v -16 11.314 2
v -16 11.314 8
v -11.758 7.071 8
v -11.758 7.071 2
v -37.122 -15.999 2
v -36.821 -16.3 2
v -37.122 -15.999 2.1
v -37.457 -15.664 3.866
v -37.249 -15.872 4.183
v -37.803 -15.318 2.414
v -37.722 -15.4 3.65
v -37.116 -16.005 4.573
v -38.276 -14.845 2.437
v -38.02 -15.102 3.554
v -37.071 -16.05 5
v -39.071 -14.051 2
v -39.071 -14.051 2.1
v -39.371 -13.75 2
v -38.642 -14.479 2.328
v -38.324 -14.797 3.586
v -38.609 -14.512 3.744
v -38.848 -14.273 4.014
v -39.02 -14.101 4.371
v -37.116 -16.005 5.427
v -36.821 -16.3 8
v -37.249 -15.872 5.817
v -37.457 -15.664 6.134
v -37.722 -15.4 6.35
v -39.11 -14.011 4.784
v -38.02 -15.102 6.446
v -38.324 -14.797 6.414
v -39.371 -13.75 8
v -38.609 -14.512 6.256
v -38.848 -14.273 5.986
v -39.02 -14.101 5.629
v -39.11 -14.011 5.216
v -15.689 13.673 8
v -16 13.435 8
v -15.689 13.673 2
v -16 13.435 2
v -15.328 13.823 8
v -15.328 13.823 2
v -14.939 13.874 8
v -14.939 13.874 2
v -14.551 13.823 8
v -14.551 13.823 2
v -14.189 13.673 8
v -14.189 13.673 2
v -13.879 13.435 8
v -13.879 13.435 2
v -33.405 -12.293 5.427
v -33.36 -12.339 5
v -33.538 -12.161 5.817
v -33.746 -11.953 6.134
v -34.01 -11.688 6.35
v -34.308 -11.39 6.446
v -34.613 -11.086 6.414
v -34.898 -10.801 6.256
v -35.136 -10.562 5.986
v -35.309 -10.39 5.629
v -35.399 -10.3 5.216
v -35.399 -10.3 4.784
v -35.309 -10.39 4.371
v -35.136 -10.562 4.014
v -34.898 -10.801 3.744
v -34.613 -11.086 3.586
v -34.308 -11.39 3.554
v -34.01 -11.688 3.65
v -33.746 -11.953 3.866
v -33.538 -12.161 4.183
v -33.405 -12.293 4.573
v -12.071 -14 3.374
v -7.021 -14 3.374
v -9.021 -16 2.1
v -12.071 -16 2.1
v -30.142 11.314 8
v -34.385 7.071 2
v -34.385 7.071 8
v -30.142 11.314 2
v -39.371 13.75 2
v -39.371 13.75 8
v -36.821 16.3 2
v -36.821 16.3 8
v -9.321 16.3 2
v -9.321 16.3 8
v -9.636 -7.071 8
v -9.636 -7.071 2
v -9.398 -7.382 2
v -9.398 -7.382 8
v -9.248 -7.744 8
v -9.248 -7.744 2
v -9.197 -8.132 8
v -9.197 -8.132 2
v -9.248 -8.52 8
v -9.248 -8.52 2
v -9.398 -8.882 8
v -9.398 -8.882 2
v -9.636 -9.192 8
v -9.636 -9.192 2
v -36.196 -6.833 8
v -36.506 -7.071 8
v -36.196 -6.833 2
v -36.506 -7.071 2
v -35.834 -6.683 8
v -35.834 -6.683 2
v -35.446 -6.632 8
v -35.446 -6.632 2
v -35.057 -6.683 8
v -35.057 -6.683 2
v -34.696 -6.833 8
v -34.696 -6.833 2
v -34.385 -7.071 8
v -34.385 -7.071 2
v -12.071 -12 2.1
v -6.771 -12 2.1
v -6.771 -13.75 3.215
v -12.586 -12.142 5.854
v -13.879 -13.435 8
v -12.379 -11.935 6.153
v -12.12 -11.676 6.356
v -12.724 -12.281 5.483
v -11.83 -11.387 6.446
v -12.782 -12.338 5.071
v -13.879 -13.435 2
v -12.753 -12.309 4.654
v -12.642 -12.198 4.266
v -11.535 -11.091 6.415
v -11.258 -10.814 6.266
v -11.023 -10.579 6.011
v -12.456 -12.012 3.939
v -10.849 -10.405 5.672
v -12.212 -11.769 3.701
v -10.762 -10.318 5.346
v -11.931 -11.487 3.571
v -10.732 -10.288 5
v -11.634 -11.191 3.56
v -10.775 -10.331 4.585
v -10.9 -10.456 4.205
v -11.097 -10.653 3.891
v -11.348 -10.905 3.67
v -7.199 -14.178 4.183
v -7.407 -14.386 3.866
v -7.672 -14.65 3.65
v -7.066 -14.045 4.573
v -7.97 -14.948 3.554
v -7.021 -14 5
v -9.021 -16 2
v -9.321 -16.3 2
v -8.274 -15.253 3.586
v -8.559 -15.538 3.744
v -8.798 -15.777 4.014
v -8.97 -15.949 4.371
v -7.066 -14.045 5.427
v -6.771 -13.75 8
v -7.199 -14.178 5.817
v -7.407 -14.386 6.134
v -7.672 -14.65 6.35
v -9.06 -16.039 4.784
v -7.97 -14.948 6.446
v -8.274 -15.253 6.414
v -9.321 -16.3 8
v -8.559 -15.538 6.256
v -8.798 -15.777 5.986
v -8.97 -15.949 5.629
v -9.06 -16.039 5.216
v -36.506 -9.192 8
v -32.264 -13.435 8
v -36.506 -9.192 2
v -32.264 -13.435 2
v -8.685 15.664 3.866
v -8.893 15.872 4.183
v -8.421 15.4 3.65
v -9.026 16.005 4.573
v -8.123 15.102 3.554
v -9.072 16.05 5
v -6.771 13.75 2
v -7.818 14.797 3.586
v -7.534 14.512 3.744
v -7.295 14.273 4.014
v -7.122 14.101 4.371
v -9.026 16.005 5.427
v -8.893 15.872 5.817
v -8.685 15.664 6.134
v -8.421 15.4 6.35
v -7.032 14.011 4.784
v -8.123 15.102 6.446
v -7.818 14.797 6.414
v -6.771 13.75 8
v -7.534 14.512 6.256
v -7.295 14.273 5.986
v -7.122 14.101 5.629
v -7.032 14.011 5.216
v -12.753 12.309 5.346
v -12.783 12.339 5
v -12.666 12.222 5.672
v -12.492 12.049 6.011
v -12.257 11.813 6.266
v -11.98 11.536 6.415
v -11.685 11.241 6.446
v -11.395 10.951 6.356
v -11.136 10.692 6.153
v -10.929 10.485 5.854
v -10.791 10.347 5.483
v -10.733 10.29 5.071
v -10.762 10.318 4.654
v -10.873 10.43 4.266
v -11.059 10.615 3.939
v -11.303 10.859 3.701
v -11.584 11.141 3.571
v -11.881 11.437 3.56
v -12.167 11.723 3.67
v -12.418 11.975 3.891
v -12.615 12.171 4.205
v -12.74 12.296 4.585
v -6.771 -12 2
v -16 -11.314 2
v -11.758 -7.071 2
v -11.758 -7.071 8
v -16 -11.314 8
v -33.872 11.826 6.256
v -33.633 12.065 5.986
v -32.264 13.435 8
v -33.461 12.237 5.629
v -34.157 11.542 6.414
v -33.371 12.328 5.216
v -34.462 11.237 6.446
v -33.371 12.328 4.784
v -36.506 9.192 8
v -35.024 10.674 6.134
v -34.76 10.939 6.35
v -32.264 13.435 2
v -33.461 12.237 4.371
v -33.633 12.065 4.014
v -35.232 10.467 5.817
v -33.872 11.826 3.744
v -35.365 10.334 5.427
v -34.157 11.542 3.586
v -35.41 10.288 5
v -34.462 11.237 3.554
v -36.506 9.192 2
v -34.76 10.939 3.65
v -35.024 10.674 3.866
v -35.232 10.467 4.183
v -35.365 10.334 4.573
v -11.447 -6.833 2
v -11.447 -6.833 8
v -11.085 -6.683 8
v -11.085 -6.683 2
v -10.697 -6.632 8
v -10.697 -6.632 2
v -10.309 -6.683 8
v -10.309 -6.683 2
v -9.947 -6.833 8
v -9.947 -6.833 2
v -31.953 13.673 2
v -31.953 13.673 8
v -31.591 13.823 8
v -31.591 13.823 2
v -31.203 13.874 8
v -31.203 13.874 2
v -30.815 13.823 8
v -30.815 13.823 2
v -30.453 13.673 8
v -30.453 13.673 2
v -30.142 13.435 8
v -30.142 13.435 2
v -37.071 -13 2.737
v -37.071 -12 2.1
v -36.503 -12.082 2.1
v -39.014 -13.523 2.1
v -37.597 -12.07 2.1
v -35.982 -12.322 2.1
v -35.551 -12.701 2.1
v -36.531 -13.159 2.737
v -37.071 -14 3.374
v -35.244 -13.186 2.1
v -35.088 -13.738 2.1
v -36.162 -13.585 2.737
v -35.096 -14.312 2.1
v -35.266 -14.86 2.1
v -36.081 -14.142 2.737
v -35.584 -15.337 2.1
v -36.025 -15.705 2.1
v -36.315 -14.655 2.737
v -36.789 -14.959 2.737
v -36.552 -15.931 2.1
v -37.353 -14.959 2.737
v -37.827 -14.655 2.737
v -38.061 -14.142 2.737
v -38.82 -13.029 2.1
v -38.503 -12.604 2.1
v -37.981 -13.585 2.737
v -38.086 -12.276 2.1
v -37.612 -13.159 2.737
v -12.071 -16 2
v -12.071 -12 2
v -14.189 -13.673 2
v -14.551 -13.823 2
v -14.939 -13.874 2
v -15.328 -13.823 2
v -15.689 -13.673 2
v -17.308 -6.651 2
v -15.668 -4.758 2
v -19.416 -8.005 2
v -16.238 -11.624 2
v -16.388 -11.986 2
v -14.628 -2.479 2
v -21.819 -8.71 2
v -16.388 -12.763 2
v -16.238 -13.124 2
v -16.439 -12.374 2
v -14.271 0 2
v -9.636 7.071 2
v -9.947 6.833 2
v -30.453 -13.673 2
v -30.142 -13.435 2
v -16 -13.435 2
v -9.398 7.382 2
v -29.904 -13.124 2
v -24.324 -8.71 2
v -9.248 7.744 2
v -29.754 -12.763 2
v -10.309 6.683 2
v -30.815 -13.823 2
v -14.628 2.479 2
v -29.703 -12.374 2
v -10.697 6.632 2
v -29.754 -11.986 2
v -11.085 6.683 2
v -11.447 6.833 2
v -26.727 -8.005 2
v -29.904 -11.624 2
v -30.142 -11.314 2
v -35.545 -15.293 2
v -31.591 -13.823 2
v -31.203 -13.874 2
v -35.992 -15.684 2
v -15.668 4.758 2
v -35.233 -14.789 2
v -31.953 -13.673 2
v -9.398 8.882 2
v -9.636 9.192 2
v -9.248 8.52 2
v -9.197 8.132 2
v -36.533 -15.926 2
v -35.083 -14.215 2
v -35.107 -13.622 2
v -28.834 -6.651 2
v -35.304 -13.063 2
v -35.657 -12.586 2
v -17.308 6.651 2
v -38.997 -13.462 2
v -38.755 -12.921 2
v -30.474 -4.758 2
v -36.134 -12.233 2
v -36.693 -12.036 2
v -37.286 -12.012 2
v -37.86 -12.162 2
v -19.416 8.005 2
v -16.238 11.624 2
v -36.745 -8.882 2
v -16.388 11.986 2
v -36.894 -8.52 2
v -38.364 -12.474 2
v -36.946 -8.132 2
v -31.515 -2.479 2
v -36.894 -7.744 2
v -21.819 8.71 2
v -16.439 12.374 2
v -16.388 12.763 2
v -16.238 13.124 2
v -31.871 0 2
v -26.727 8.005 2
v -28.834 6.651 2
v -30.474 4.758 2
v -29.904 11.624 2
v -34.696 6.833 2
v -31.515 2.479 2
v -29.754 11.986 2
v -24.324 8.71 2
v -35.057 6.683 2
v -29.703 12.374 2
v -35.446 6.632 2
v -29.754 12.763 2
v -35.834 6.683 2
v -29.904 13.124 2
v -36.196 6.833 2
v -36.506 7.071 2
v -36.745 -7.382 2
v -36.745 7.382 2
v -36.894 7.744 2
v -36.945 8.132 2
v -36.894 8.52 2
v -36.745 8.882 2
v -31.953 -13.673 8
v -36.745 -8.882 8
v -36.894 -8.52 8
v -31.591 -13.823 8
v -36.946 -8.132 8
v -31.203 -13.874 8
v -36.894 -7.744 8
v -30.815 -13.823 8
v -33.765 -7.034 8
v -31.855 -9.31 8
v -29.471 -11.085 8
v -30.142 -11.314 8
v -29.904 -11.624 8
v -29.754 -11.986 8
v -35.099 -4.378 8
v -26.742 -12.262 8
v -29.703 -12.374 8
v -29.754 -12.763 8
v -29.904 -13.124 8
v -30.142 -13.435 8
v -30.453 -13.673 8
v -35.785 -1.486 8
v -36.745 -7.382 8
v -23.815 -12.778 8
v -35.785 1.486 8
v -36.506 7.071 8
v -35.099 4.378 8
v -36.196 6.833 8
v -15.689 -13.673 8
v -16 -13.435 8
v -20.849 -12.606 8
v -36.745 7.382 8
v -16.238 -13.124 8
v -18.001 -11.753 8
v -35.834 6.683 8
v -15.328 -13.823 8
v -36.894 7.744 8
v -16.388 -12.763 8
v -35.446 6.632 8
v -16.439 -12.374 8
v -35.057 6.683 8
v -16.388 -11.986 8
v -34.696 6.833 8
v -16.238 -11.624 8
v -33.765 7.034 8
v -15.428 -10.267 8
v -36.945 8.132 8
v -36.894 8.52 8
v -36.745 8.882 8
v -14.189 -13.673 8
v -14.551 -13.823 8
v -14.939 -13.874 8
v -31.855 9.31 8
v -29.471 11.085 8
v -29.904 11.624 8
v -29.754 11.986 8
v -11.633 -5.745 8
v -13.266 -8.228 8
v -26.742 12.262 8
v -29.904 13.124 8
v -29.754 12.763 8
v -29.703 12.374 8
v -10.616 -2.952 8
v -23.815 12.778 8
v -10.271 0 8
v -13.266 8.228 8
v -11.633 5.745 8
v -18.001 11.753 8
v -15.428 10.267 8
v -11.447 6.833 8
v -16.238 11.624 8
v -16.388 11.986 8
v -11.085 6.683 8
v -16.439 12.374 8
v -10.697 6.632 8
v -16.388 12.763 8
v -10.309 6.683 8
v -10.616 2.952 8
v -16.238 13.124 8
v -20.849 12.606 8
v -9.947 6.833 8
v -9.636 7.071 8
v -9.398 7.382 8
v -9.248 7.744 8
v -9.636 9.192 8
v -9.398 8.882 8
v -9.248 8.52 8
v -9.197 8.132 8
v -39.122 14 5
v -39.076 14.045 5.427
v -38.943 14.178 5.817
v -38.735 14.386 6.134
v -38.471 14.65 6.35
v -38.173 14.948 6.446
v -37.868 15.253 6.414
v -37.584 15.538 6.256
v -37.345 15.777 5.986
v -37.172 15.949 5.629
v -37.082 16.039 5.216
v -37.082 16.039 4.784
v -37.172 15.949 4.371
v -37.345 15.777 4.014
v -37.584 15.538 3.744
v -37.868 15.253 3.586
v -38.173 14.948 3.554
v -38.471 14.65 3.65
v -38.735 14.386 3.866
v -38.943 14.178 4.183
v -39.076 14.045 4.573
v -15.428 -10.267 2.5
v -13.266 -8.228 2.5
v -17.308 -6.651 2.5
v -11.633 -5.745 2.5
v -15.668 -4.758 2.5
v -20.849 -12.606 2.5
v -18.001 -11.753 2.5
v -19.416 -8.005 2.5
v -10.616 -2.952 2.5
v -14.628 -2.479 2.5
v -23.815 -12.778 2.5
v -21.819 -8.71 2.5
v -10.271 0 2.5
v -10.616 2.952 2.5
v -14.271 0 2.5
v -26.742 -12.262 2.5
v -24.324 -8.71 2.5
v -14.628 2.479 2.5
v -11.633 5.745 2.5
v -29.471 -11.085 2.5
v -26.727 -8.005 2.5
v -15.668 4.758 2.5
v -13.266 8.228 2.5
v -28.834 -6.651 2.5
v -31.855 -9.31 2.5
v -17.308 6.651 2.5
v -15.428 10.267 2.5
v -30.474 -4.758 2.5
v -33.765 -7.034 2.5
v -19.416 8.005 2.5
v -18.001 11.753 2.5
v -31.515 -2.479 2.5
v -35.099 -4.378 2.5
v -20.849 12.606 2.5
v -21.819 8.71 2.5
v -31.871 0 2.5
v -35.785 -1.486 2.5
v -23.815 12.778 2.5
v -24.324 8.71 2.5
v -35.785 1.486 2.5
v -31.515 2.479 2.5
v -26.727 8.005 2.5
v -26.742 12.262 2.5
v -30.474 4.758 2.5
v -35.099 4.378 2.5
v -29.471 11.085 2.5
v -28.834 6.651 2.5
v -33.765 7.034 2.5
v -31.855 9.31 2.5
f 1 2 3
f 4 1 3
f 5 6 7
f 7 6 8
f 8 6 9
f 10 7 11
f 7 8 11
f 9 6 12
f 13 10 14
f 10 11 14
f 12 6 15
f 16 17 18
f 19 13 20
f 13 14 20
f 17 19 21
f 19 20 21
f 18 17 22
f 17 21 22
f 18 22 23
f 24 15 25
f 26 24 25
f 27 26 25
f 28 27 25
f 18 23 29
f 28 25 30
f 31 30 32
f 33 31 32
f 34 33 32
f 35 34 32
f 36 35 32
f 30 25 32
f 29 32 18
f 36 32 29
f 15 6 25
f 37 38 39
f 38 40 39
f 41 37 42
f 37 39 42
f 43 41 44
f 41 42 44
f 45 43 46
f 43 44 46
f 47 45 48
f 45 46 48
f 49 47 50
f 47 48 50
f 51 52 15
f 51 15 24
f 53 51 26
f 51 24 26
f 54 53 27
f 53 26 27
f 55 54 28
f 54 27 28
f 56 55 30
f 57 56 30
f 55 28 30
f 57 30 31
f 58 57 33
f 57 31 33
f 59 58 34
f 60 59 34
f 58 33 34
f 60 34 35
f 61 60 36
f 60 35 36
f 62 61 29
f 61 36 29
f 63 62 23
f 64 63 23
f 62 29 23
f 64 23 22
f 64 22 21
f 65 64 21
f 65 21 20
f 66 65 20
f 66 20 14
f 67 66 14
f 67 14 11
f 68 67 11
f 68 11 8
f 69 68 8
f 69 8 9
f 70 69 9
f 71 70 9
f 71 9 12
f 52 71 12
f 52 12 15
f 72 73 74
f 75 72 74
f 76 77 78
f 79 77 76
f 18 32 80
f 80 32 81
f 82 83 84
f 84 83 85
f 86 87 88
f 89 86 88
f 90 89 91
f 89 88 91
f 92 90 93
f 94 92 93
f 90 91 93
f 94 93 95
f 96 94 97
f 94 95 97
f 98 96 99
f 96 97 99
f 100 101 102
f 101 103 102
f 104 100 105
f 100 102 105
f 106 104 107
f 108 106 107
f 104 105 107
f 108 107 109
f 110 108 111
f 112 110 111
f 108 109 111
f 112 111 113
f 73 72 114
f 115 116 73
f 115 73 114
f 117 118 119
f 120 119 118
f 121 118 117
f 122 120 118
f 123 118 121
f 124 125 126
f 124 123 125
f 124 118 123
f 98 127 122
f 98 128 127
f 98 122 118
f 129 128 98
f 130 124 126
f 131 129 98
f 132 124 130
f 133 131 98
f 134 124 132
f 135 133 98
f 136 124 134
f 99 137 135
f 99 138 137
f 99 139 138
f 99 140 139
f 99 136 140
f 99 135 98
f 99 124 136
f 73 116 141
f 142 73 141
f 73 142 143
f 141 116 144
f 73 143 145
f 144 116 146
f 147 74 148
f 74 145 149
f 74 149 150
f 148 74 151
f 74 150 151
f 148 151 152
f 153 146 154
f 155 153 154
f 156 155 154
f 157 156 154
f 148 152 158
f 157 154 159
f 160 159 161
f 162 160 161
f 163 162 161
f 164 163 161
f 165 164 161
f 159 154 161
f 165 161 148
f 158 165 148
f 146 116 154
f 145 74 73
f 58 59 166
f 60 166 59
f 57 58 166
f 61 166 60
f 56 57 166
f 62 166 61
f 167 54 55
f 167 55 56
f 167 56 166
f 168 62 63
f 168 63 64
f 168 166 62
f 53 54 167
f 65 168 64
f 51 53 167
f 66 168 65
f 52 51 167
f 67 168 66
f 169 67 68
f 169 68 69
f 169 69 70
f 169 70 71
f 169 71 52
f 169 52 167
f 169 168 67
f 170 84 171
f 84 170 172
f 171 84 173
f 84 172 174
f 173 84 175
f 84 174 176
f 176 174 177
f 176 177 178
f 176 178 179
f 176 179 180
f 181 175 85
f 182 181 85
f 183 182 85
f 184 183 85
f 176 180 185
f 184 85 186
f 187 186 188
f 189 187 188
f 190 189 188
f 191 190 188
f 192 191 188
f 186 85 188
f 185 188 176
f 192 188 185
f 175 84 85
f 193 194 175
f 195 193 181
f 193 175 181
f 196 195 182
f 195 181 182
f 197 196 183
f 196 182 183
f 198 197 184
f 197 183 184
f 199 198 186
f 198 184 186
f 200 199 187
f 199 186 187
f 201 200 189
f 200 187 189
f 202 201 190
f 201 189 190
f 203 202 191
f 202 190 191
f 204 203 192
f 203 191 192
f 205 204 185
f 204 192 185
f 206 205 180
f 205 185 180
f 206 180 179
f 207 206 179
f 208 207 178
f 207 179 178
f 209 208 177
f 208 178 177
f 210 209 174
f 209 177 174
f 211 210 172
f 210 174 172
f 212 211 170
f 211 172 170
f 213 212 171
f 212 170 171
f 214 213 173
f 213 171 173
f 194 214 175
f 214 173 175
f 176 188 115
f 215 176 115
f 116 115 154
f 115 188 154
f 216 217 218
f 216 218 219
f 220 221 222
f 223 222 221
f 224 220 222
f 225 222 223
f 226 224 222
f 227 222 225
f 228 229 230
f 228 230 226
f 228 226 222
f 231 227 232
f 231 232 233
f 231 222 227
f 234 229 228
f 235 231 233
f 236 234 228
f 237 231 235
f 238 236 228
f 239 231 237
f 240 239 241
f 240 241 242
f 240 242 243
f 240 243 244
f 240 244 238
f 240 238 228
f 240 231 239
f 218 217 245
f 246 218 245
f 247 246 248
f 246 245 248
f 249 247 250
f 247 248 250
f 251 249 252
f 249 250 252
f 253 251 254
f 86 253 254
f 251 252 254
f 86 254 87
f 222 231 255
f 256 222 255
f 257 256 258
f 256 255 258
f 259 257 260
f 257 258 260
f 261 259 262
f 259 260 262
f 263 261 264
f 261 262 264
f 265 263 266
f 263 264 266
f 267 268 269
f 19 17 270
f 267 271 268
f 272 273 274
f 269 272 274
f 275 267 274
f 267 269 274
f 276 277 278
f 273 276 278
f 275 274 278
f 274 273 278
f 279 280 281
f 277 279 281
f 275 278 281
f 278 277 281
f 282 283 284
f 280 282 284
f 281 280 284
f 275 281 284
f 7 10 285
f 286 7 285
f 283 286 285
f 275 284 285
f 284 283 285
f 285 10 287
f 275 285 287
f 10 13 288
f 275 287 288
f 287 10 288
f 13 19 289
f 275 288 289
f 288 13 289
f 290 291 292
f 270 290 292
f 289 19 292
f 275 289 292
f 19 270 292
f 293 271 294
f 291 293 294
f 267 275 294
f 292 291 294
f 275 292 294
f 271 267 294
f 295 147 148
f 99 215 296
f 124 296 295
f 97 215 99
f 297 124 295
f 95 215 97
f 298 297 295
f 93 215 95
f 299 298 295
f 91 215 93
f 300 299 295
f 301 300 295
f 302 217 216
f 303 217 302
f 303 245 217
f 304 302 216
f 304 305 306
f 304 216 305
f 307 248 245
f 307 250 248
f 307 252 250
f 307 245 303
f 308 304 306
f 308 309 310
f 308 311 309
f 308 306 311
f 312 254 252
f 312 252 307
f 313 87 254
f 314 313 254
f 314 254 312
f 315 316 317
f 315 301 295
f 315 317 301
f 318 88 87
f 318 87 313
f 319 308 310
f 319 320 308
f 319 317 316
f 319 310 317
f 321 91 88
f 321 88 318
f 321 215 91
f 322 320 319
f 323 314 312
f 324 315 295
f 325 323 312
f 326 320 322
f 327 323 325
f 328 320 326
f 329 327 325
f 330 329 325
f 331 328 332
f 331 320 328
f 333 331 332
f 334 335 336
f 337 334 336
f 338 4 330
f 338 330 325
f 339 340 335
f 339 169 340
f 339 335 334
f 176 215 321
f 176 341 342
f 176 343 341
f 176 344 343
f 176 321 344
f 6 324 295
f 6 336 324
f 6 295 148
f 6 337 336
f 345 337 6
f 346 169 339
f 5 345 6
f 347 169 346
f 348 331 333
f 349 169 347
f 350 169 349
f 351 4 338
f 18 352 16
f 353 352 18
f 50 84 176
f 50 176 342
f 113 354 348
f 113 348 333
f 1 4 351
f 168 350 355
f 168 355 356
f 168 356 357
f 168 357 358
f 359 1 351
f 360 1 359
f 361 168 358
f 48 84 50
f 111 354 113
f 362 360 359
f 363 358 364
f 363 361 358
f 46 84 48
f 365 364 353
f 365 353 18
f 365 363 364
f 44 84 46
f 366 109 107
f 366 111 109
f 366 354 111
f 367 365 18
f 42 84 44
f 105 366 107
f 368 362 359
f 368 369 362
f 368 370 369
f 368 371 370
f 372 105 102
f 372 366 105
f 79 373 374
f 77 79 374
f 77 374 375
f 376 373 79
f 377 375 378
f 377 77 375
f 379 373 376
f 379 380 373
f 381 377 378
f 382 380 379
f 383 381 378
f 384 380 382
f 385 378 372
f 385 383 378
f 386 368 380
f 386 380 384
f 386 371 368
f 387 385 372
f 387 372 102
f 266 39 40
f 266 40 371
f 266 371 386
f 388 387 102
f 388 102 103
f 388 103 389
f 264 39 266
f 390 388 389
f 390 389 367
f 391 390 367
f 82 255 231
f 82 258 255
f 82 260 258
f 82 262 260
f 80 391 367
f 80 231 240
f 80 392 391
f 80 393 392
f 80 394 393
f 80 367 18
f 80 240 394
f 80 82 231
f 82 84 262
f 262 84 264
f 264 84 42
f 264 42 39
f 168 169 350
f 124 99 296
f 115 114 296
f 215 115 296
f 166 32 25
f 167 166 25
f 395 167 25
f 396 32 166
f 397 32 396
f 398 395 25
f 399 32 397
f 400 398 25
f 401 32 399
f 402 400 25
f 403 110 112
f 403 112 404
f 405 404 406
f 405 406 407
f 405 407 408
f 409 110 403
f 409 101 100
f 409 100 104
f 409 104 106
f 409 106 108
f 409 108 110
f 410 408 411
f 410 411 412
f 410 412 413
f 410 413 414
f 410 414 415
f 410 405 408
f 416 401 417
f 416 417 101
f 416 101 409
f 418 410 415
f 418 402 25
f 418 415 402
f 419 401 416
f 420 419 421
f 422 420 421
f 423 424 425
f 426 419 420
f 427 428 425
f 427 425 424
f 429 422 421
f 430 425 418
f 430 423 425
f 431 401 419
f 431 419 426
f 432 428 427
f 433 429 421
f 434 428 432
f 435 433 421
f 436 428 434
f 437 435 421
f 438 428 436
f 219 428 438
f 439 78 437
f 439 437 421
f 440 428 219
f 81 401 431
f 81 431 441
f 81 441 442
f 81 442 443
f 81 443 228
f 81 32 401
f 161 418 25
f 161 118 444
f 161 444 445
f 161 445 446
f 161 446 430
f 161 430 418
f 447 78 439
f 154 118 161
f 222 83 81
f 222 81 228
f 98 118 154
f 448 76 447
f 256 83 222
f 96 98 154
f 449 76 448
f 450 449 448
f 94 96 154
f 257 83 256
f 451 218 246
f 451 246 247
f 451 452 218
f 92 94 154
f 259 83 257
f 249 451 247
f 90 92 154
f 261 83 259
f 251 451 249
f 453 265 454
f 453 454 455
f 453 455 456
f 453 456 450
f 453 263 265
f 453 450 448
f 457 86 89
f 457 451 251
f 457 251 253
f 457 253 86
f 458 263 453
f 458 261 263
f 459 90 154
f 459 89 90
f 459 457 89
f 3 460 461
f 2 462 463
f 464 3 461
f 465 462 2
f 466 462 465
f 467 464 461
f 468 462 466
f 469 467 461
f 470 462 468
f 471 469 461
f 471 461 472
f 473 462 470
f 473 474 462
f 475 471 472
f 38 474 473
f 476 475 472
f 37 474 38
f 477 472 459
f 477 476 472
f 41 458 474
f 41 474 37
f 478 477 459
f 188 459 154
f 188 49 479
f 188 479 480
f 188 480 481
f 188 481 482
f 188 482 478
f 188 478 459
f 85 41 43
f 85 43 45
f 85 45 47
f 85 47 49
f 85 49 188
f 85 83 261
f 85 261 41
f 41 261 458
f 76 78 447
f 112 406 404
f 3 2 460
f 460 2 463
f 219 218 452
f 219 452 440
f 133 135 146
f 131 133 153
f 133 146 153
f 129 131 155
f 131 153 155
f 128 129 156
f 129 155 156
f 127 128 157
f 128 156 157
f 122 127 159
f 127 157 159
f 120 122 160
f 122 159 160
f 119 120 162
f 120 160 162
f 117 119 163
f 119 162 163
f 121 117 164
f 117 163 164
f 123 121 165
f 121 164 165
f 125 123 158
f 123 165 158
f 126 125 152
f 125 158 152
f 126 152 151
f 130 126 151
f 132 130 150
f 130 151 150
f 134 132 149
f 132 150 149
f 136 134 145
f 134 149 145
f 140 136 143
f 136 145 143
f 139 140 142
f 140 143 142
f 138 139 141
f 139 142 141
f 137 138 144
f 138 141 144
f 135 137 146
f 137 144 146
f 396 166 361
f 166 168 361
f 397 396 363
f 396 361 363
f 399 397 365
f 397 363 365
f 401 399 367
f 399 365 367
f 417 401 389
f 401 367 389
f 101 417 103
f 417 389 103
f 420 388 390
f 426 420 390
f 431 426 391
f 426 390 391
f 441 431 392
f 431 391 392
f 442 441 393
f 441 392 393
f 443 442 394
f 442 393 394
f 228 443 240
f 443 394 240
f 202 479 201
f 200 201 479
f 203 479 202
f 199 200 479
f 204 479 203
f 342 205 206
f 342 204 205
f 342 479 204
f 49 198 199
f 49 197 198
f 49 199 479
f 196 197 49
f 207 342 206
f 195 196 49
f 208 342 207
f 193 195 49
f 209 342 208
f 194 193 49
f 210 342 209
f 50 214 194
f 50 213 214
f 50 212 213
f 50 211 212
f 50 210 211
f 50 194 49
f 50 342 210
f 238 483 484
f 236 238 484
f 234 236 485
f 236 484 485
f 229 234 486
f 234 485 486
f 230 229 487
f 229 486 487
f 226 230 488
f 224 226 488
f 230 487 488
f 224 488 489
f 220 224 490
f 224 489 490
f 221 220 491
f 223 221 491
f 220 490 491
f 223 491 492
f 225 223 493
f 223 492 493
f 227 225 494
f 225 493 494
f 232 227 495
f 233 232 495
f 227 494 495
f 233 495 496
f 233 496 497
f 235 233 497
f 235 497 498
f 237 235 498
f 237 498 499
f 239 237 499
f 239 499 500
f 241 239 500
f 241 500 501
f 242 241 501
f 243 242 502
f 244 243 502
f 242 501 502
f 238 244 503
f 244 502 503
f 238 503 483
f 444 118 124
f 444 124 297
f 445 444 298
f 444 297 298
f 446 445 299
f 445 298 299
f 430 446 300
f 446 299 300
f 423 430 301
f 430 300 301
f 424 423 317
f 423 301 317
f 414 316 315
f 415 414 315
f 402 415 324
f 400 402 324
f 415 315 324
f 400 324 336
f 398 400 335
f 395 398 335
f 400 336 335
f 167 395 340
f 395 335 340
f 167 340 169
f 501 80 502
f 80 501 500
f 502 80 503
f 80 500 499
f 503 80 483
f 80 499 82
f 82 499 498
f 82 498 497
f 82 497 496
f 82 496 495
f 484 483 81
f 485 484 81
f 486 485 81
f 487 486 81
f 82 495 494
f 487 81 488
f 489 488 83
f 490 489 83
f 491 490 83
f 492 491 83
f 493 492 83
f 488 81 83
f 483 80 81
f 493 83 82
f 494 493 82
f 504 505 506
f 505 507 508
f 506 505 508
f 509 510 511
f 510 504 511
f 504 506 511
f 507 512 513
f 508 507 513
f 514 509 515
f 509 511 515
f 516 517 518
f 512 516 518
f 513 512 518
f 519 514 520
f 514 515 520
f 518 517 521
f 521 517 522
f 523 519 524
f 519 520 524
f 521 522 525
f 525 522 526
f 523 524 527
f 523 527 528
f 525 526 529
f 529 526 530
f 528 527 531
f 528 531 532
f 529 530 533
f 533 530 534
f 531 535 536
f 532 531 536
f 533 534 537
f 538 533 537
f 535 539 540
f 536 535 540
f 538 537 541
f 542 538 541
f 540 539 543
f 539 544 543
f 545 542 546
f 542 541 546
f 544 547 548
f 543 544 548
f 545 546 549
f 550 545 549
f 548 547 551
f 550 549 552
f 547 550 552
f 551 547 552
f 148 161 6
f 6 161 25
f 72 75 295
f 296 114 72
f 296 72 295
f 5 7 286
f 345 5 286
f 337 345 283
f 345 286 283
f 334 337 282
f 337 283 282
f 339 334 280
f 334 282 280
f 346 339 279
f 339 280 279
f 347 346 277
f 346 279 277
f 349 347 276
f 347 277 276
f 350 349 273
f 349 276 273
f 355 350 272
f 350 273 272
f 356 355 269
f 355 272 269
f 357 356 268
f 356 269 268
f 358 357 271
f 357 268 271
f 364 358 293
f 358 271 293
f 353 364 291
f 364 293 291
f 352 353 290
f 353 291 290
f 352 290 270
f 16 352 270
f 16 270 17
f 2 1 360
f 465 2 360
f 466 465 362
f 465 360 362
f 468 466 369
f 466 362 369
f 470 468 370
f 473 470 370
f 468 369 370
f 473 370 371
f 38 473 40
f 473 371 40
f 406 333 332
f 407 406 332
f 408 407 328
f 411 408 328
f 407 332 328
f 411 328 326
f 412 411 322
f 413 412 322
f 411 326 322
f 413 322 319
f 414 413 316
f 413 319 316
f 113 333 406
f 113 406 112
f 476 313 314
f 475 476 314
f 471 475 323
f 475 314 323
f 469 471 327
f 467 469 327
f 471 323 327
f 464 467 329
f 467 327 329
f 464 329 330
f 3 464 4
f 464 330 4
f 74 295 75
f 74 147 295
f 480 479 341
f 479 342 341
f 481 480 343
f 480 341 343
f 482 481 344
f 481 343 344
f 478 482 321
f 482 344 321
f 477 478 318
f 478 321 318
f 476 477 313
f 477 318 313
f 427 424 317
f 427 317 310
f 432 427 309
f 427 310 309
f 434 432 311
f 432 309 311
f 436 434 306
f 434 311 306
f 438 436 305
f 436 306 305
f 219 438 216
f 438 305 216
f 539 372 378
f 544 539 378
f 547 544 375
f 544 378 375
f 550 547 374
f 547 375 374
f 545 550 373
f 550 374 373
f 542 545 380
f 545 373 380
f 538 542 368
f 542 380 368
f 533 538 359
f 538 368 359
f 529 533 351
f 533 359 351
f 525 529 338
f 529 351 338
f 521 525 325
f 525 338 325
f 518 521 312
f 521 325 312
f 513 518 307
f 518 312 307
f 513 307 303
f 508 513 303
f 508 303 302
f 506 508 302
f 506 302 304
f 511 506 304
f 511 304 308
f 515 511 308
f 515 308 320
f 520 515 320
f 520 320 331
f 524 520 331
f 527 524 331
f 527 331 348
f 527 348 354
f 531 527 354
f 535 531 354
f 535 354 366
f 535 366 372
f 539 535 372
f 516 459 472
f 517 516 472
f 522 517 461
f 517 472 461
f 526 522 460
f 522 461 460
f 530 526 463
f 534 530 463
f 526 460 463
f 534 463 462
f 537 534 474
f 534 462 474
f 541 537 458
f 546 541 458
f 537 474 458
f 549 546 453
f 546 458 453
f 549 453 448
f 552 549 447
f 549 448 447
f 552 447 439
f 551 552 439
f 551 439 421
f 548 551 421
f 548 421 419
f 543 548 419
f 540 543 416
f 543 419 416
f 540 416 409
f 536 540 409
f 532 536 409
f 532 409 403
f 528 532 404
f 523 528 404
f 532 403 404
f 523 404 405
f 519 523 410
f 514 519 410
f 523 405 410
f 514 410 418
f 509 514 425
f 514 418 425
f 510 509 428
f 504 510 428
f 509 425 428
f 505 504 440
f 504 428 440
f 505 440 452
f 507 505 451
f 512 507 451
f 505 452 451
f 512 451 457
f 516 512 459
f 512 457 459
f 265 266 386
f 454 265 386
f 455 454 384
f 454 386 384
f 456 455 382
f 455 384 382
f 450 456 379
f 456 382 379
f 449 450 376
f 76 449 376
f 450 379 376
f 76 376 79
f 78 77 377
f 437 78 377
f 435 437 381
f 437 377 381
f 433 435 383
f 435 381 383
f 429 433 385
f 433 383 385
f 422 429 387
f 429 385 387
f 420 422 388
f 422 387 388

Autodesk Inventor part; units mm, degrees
ref_plane "YZ Plane" through (0, 0, 0) normal (1, 0, 0) x (0, 1, 0)
ref_plane "XY Plane" through (0, 0, 0) normal (0, 0, 1) x (1, 0, 0)
ref_plane "Work Plane1" through (0, 0, 2) normal (0, 0, 1) x (1, 0, 0)
sketch "Sketch1" plane through (0, 0, 2) normal (0, 0, 1) x (1, 0, 0)
  circle A0 centre (-37.0712, 14) radius 3.25 construction
  circle A1 centre (-9.0712, -14) radius 3.25 construction
  line L0 (-26.0712, -17.08) -> (-20.0712, -17.08) construction
  arc A2 (-20.0712, -17.08) -> (-20.0712, -14.08) centre (-20.0712, -15.58) ccw construction
  line L1 (-20.0712, -14.08) -> (-26.0712, -14.08) construction
  line L2 (-37.0712, -3) -> (-37.0712, 3) construction
  arc A3 (-37.0712, 3) -> (-40.0712, 3) centre (-38.5712, 3) ccw construction
  line L3 (-40.0712, 3) -> (-40.0712, -3) construction
  line L4 (-47.9712, -17) -> (-47.9712, 17) construction
  line L5 (-47.9712, 17) -> (-44.3964, 17) construction
  line L6 (-44.3964, 17) -> (-40.0712, 21.3252) construction
  line L7 (-40.0712, 21.3252) -> (-40.0712, 24.9) construction
  line L8 (-40.0712, 24.9) -> (-6.0712, 24.9) construction
  line L9 (-6.0712, 24.9) -> (-6.0712, 21.3252) construction
  line L10 (-6.0712, 21.3252) -> (-1.746, 17) construction
  line L11 (-1.746, 17) -> (1.8288, 17) construction
  line L12 (1.8288, 17) -> (1.8288, -17) construction
  line L13 (1.8288, -17) -> (-1.746, -17) construction
  line L14 (-1.746, -17) -> (-6.1126, -21.3666) construction
  line L15 (-6.1126, -21.3666) -> (-6.1126, -24.9) construction
  line L16 (-6.1126, -24.9) -> (-40.0712, -24.9) construction
  circle A4 centre (-37.0712, -14) radius 3.25 construction
  circle A5 centre (-23.0712, 0) radius 12.45 construction
  circle A6 centre (-23.0712, 0) radius 12.7 construction
  line L17 (-37.0712, 14) -> (-9.0712, 14) construction
  line L18 (-9.0712, 14) -> (-9.0712, -14) construction
  line L19 (-9.0712, -14) -> (-37.0712, -14) construction
  line L20 (-37.0712, -14) -> (-37.0712, 14) construction
  line L21 (-4.0712, -19) -> (-4.0712, 19)
  line L22 (-4.0712, 19) -> (-42.0712, 19)
  line L23 (-42.0712, 19) -> (-42.0712, -19)
  line L24 (-42.0712, -19) -> (-4.0712, -19)
  circle A7 centre (-23.0712, 0) radius 12.8
  circle A8 centre (-23.0712, 0) radius 3.25 projected
  line L25 (-40.0712, -24.9) -> (-40.0712, -21.3252) projected
  line L26 (-40.0712, -21.3252) -> (-44.3964, -17) projected
  line L27 (-44.3964, -17) -> (-47.9712, -17) projected
  arc A9 (-26.0712, -14.08) -> (-26.0712, -17.08) centre (-26.0712, -15.58) ccw projected
  arc A10 (-40.0712, -3) -> (-37.0712, -3) centre (-38.5712, -3) ccw projected
  circle A11 centre (-37.0712, -14) radius 3.25 projected
  point P0 (0, 0)
  point P1 (-21.8762, -3.0223)
  point P2 (-25.9925, 1.4242)
  dimension "d0" = 5
  dimension "d1" = 0.1
extrude "Extrusion1" add sketch "Sketch1" along normal blind 6 contours L24 L23 L22 L21 | A7 | A8 | A11
sketch "Sketch2" plane through (0, 0, 2) normal (0, 0, -1) x (-1, 0, 0)
  circle A0 centre (23.0712, 0) radius 12.8 projected
  circle A1 centre (23.0712, 0) radius 8.5824
  point P0 (0, 0)
extrude "Extrusion2" add sketch "Sketch2" against normal blind 0.5
sketch "Sketch3" plane through (0, 0, 2) normal (0, 0, -1) x (-1, 0, 0)
  circle A0 centre (9.0712, -14) radius 1.45 construction
  circle A1 centre (9.0712, -14) radius 2.45
  circle A2 centre (37.0712, -14) radius 1.45 projected
  circle A3 centre (37.0712, -14) radius 1.95
  point P0 (0, 0)
  dimension "d8" = 1
  dimension "d10" = 0.5
sketch "Sketch5" plane through (0, 0, 2) normal (0, 0, -1) x (-1, 0, 0)
  arc A0 (20.0712, -14.08) -> (20.0712, -17.08) centre (20.0712, -15.58) ccw construction
  arc A1 (26.0712, -17.08) -> (26.0712, -14.08) centre (26.0712, -15.58) ccw construction
  line L0 (37.0712, 3) -> (37.0712, -3) projected
  arc A2 (37.0712, -3) -> (40.0712, -3) centre (38.5712, -3) ccw projected
  line L1 (40.0712, -3) -> (40.0712, 3) projected
  arc A3 (40.0712, 3) -> (37.0712, 3) centre (38.5712, 3) ccw projected
  line L2 (26.0712, -14.08) -> (20.0712, -14.08) construction
  arc A4 (20.0712, -14.08) -> (20.0712, -17.08) centre (20.0712, -15.58) ccw construction
  line L3 (20.0712, -17.08) -> (26.0712, -17.08) construction
  arc A5 (26.0712, -17.08) -> (26.0712, -14.08) centre (26.0712, -15.58) ccw construction
  circle A6 centre (37.0712, -14) radius 1.45 projected
  circle A7 centre (23.0712, 0) radius 1.45 projected
  circle A8 centre (9.0712, -14) radius 1.45 projected
  circle A9 centre (37.0712, 14) radius 1.45 projected
  line L4 (-1.8288, -17) -> (-1.8288, 17) projected
  line L5 (-1.8288, 17) -> (1.746, 17) projected
  line L6 (1.746, 17) -> (6.0712, 21.3252) projected
  line L7 (6.0712, 21.3252) -> (6.0712, 24.9) projected
  line L8 (6.0712, 24.9) -> (40.0712, 24.9) projected
  line L9 (40.0712, 24.9) -> (40.0712, 21.3252) projected
  line L10 (40.0712, 21.3252) -> (44.3964, 17) projected
  line L11 (44.3964, 17) -> (47.9712, 17) projected
  line L12 (47.9712, 17) -> (47.9712, -17) projected
  line L13 (44.3964, -17) -> (47.9712, -17) projected
  line L14 (40.0712, -21.3252) -> (44.3964, -17) projected
  line L15 (40.0712, -24.9) -> (40.0712, -21.3252) projected
  line L16 (6.1126, -24.9) -> (40.0712, -24.9) projected
  line L17 (6.1126, -24.9) -> (6.1126, -21.3666) projected
  line L18 (6.1126, -21.3666) -> (1.746, -17) projected
  line L19 (1.746, -17) -> (-1.8288, -17) projected
  line L20 (42.0712, -19) -> (4.0712, -19) projected
  arc A10 (7.0712, -3) -> (8.5712, -4.5) centre (8.5712, -3) ccw
  arc A11 (10.0712, 3) -> (8.5712, 4.5) centre (8.5712, 3) ccw
  line L21 (10.0712, 3) -> (10.0712, -3)
  line L22 (8.5712, 3) -> (8.5712, -3.1288) construction
  line L23 (7.0712, -3) -> (7.0712, 3)
  arc A12 (8.5712, 4.5) -> (7.0712, 3) centre (8.5712, 3) ccw
  arc A13 (8.5712, -4.5) -> (10.0712, -3) centre (8.5712, -3) ccw
  line L24 (4.0712, -19) -> (4.0712, 19) projected
  line L25 (42.0712, 19) -> (42.0712, -19) projected
  line L26 (4.0712, 19) -> (42.0712, 19) projected
  circle A14 centre (23.0712, 0) radius 16 construction
  arc A15 (20.0712, 16) -> (18.5712, 14.5) centre (20.0712, 14.5) ccw
  line L27 (26.0712, 14.5) -> (19.9423, 14.5) construction
  line L28 (20.0712, 16) -> (26.0712, 16)
  line L29 (26.0712, 13) -> (20.0712, 13)
  arc A16 (27.5712, 14.5) -> (26.0712, 16) centre (26.0712, 14.5) ccw
  arc A17 (26.0712, 13) -> (27.5712, 14.5) centre (26.0712, 14.5) ccw
  arc A18 (18.5712, 14.5) -> (20.0712, 13) centre (20.0712, 14.5) ccw
  arc A19 (39.0712, 3) -> (37.5712, 4.5) centre (37.5712, 3) ccw
  line L30 (37.5712, -3) -> (37.5712, 3.1288) construction
  line L31 (39.0712, 3) -> (39.0712, -3)
  line L32 (36.0712, -3) -> (36.0712, 3)
  arc A20 (37.5712, -4.5) -> (39.0712, -3) centre (37.5712, -3) ccw
  arc A21 (36.0712, -3) -> (37.5712, -4.5) centre (37.5712, -3) ccw
  arc A22 (37.5712, 4.5) -> (36.0712, 3) centre (37.5712, 3) ccw
  arc A23 (26.0712, -16) -> (27.5712, -14.5) centre (26.0712, -14.5) ccw
  line L33 (20.0712, -14.5) -> (26.2, -14.5) construction
  line L34 (26.0712, -16) -> (20.0712, -16)
  line L35 (20.0712, -13) -> (26.0712, -13)
  arc A24 (18.5712, -14.5) -> (20.0712, -16) centre (20.0712, -14.5) ccw
  arc A25 (20.0712, -13) -> (18.5712, -14.5) centre (20.0712, -14.5) ccw
  arc A26 (27.5712, -14.5) -> (26.0712, -13) centre (26.0712, -14.5) ccw
  arc A27 (13.8788, -13.435) -> (16.0001, -13.435) centre (14.9394, -12.3744) ccw
  circle A28 centre (23.0712, 0) radius 16 construction
  line L36 (11.7575, -7.0711) -> (16.0001, -11.3137)
  line L37 (13.8788, -13.435) -> (9.6361, -9.1924)
  line L38 (10.6968, -8.1317) -> (15.0305, -12.4655) construction
  arc A29 (36.5062, -7.0711) -> (34.3849, -7.0711) centre (35.4455, -8.1317) ccw
  arc A30 (9.6361, -7.0711) -> (9.6361, -9.1924) centre (10.6968, -8.1317) ccw
  arc A31 (11.7575, -7.0711) -> (9.6361, -7.0711) centre (10.6968, -8.1317) ccw
  arc A32 (16.0001, -13.435) -> (16.0001, -11.3137) centre (14.9394, -12.3744) ccw
  arc A33 (9.6361, 9.1924) -> (9.6361, 7.0711) centre (10.6968, 8.1317) ccw
  line L39 (14.9394, 12.3744) -> (10.6057, 8.0406) construction
  arc A34 (16.0001, 11.3137) -> (16.0001, 13.435) centre (14.9394, 12.3744) ccw
  arc A35 (16.0001, 13.435) -> (13.8788, 13.435) centre (14.9394, 12.3744) ccw
  line L40 (16.0001, 11.3137) -> (11.7575, 7.0711)
  line L41 (9.6361, 9.1924) -> (13.8788, 13.435)
  arc A36 (9.6361, 7.0711) -> (11.7575, 7.0711) centre (10.6968, 8.1317) ccw
  line L42 (34.3849, 7.0711) -> (30.1422, 11.3137)
  arc A37 (34.3849, 7.0711) -> (36.5062, 7.0711) centre (35.4455, 8.1317) ccw
  arc A38 (30.1422, 13.435) -> (30.1422, 11.3137) centre (31.2029, 12.3744) ccw
  line L43 (35.4455, 8.1317) -> (31.1118, 12.4655) construction
  arc A39 (32.2636, 13.435) -> (30.1422, 13.435) centre (31.2029, 12.3744) ccw
  line L44 (32.2636, 13.435) -> (36.5062, 9.1924)
  arc A40 (36.5062, 7.0711) -> (36.5062, 9.1924) centre (35.4455, 8.1317) ccw
  line L45 (31.2029, -12.3744) -> (35.5366, -8.0406) construction
  line L46 (30.1422, -11.3137) -> (34.3849, -7.0711)
  arc A41 (30.1422, -11.3137) -> (30.1422, -13.435) centre (31.2029, -12.3744) ccw
  line L47 (36.5062, -9.1924) -> (32.2636, -13.435)
  arc A42 (30.1422, -13.435) -> (32.2636, -13.435) centre (31.2029, -12.3744) ccw
  arc A43 (36.5062, -9.1924) -> (36.5062, -7.0711) centre (35.4455, -8.1317) ccw
  point P0 (0, 0)
  point P1 (40.0712, -3)
  point P2 (4.0712, 0)
  point P3 (7.0712, 0)
  point P4 (23.0712, 16)
  point P5 (39.0712, 0)
  point P6 (23.0712, -16)
  point P7 (11.7575, -11.3137)
  point P8 (13.8788, -9.1924)
  point P9 (11.7575, 11.3137)
  point P10 (34.3849, 11.3137)
  point P11 (34.3849, -11.3137)
  point P12 (11.7575, 11.3137)
  point P13 (34.3849, -11.3137)
  point P14 (34.3849, 11.3137)
  point P15 (13.8788, -9.1924)
  dimension "d133" = 360
  dimension "d144" = 360
  dimension "d240" = 32
  dimension "d139" = 1.5
  dimension "d140" = 1.5
  dimension "d141" = 3
  dimension "d234" = 3
  dimension "d235" = 9
  dimension "d238" = 360
  dimension "d280" = 1.5
  dimension "d281" = 1.5
  dimension "d282" = 3
  dimension "d283" = 3
  dimension "d284" = 9
  dimension "d285" = 32
extrude "Extrusion5" cut sketch "Sketch5" against normal blind 8 contours L37 A30 A31 L36 A32 A27 | A43 L47 A42 A41 L46 A29 | L41 A35 A34 L40 A36 A33 | L42 A38 A39 L44 A40 A37
sketch "Sketch6" plane through (-42.0712, -19, 8) normal (0, -1, 0) x (1, 0, 0)
  line L0 (0, -6) -> (38, -6) projected
  line L1 (38, -6) -> (38, 0) projected
  line L2 (0, 0) -> (38, 0) projected
  line L3 (0, -6) -> (0, 0) projected
  line L4 (31.8, 0) -> (31.8, 0) projected
  circle A0 centre (19, -3.5) radius 1.45
  point P0 (42.0712, -8)
  point P1 (4.5, 0)
  dimension "d34" = 2.9
  dimension "d126" = 2.5
extrude "Extrusion6" [suppressed]
pattern_circular "Circular Pattern1" [suppressed]
chamfer "Chamfer1" distance 3 angle 45 4 edges at (-42.0712, 19, 5) (-4.0712, 19, 5) (-4.0712, -19, 5) (-42.0712, -19, 5)
sketch "Sketch13" plane through (0, 0, 2) normal (0, 0, -1) x (-1, 0, 0)
  circle A0 centre (23.0712, 0) radius 10.0484
  line L0 (42.0712, 16) -> (42.0712, -16) projected
  line L1 (39.0712, -19) -> (7.0712, -19) projected
  circle A1 centre (23.0712, 0) radius 3.25
  point P0 (0, 0)
  point P1 (42.0712, 0)
  point P2 (23.0712, -19)
hole "Hole1" at (-37.0712, -14, 2) direction (0, 0, 1) diameter 4 depth 0.1 tip angle 115
sketch "Sketch4" plane through (-4.0712, -19, 2) normal (1, 0, 0) x (0, 0, -1)
  line L0 (2, 4.45) -> (6, 4.45)
  line L1 (2, 1.55) -> (6, 1.55)
  line L2 (0, 0) -> (0, 38) projected
  arc A0 (2, 19) -> (2, 19) centre (1.5, 4.4206) ccw projected
  line L3 (-1.3741, 5) -> (-0.1, 7) projected
  line L4 (-1.3741, 5) -> (-0.1, 3) projected
  line L5 (-0.1, 7) -> (0.6045, 7)
  line L6 (0.6045, 7) -> (0.6045, 3)
  line L7 (0.6045, 3) -> (-0.1, 3)
  line L8 (-0.1, 3) -> (-0.1, 7)
extrude "Extrusion4" cut sketch "Sketch4" against normal blind 8 contours L7 L8 L5 L2 | L2 L5 L6 L7 | L4 L3 L8
sketch "Sketch9" plane through (-39.0712, 19, 2) normal (0, 1, 0) x (1, 0, 0)
  line L0 (35.8594, -6) -> (35.8594, -4)
  line L1 (35.8594, -4) -> (-5.4569, -4)
  line L2 (-5.4569, -4) -> (-5.4569, -6)
  line L3 (-5.4569, -6) -> (35.8594, -6)
  line L4 (32, -6) -> (0, -6) projected
  point P0 (39.0712, 2)
  dimension "d51" = 2
extrude "Extrusion9" [suppressed]
sketch "Sketch11" plane through (0, 0, 2) normal (0, 0, -1) x (-1, 0, 0)
  circle A0 centre (23.0712, 0) radius 3.25 projected
  line L0 (12.0712, -16) -> (4.0712, -16) projected
  line L1 (7.0712, -19) -> (4.0712, -16) projected
  line L2 (39.0712, -19) -> (7.0712, -19) projected
  line L3 (42.0712, -16) -> (39.0712, -19) projected
  line L4 (42.0712, 16) -> (42.0712, -16) projected
  line L5 (39.0712, 19) -> (42.0712, 16) projected
  line L6 (7.0712, 19) -> (39.0712, 19) projected
  line L7 (4.0712, 16) -> (7.0712, 19) projected
  line L8 (4.0712, -12) -> (4.0712, 16) projected
  line L9 (4.0712, -12) -> (12.0712, -12) projected
  line L10 (12.0712, -12) -> (12.0712, -16) projected
  circle A1 centre (37.0712, -14) radius 2 projected
  circle A2 centre (23.0712, 0) radius 3.25 projected
  line L11 (4.0712, -12) -> (4.0712, 16) projected
  circle A3 centre (13.1721, 17.5) radius 1
  circle A4 centre (33.6721, 11) radius 1
  circle A5 centre (18.1721, -10.5) radius 1
  circle A6 centre (33.6721, 11) radius 0.9
  circle A7 centre (13.1721, 17.5) radius 0.9
  circle A8 centre (18.1721, -10.5) radius 0.9
  circle A9 centre (23.0712, 0) radius 7.071
  point P0 (0, 0)
  point P1 (0, 0)
  dimension "d57" = 1.8
  dimension "d58" = 1.8
  dimension "d59" = 1.8
extrude "Extrusion10" [suppressed]
sketch "Sketch12" plane through (0, 0, 8) normal (0, 0, 1) x (1, 0, 0)
  line L0 (-32.0962, 9.025) -> (-14.0462, 9.025) construction
  line L1 (-14.0462, 9.025) -> (-14.0462, -9.025) construction
  line L2 (-14.0462, -9.025) -> (-32.0962, -9.025) construction
  line L3 (-32.0962, -9.025) -> (-32.0962, 9.025) construction
  line L4 (-7.0712, 19) -> (-39.0712, 19) projected
  line L5 (-4.0712, -16) -> (-4.0712, 16) projected
  circle A0 centre (-23.0712, 0) radius 12.8
  point P0 (0, 0)
  point P1 (-23.0712, 9.025)
  point P2 (-23.0712, 19)
  point P3 (-14.0462, 0)
  point P4 (-4.0712, 0)
  dimension "d62" = 18.05
  dimension "d63" = 18.05
  dimension "d205" = 25.6
extrude "Extrusion11" cut sketch "Sketch12" against normal blind 6
sketch "Sketch14" plane through (0, 0, 8) normal (0, 0, 1) x (1, 0, 0)
  line L0 (-39.0712, -19) -> (-42.0712, -16) projected
  line L1 (-39.0712, -19) -> (-7.0712, -19) projected
  line L2 (-4.0712, -16) -> (-7.0712, -19) projected
  line L3 (-4.0712, -16) -> (-4.0712, 16) projected
  line L4 (-7.0712, 19) -> (-4.0712, 16) projected
  line L5 (-7.0712, 19) -> (-39.0712, 19) projected
  line L6 (-42.0712, 16) -> (-39.0712, 19) projected
  line L7 (-42.0712, 16) -> (-42.0712, -16) projected
  line L8 (-36.8212, 16.3) -> (-9.3212, 16.3)
  line L9 (-9.3212, 16.3) -> (-6.7712, 13.75)
  line L10 (-6.7712, 13.75) -> (-6.7712, -13.75)
  line L11 (-6.7712, -13.75) -> (-9.3212, -16.3)
  line L12 (-9.3212, -16.3) -> (-36.8212, -16.3)
  line L13 (-36.8212, -16.3) -> (-39.3712, -13.75)
  line L14 (-39.3712, -13.75) -> (-39.3712, 13.75)
  line L15 (-39.3712, 13.75) -> (-36.8212, 16.3)
  line L16 (-7.0712, 19) -> (-39.0712, 19) projected
  line L17 (-7.0712, 19) -> (-4.0712, 16) projected
  line L18 (-4.0712, -16) -> (-7.0712, -19) projected
  line L19 (-4.0712, -16) -> (-4.0712, 16) projected
  line L20 (-39.0712, -19) -> (-7.0712, -19) projected
  line L21 (-39.0712, -19) -> (-42.0712, -16) projected
  line L22 (-42.0712, 16) -> (-42.0712, -16) projected
  line L23 (-42.0712, 16) -> (-39.0712, 19) projected
  point P0 (-23.0712, 16.3)
  point P1 (-23.0712, 19)
  point P2 (-23.0712, -16.3)
  point P3 (-6.7712, 0)
  point P4 (-4.0712, 0)
  point P5 (-39.3712, 0)
  point P6 (-42.0712, 0)
  point P7 (-8.0462, -15.025)
  point P8 (-38.0962, 15.025)
  point P9 (-38.0962, -15.025)
  point P10 (-8.0462, 15.025)
  dimension "d190" = 27.5
  dimension "d194" = 2.7
  dimension "d195" = 2.7
  dimension "d196" = 2.7
  dimension "d197" = 2.7
  dimension "d198" = 27.5
  dimension "d199" = 27.5
  dimension "d200" = 27.5
  dimension "d201" = 3.6062
  dimension "d202" = 3.6062
  dimension "d203" = 3.6062
  dimension "d204" = 3.6062
extrude "Extrusion12" cut sketch "Sketch14" against normal blind 10 contours L8 L9 L10 L11 L12 L13 L14 L15 keep common part
sketch "Sketch16" plane through (0, 0, 2) normal (0, 0, -1) x (-1, 0, 0)
  circle A0 centre (23.0712, 0) radius 12.8
  circle A1 centre (23.0712, 0) radius 8.8
  point P0 (0, 0)
  point P1 (14.0462, -9.025)
  dimension "d206" = 25.6
  dimension "d207" = 4
extrude "Extrusion14" add sketch "Sketch16" against normal blind 0.5
sketch "Sketch17" plane through (-36.4185, -16.7027, 8) normal (-0.7071, -0.7071, 0) x (-0.7071, 0.7071, 0)
  line L0 (0.3726, 6) -> (4.3726, 6) projected
  point P0 (-13.9412, 8)
  point P1 (3.7506, 6)
sketch "Sketch18" plane through (0, 0, 8) normal (0, 0, 1) x (1, 0, 0)
  circle A0 centre (-23.0712, 0) radius 12.8 projected
  circle A1 centre (-23.0712, 0) radius 12.8 projected
  line L0 (-20.0712, 14.5) -> (-26.0712, 14.5) construction
  line L1 (-20.0712, 16) -> (-26.0712, 16)
  line L2 (-26.0712, 13) -> (-20.0712, 13)
  arc A2 (-20.0712, 13) -> (-20.0712, 16) centre (-20.0712, 14.5) ccw
  arc A3 (-26.0712, 16) -> (-26.0712, 13) centre (-26.0712, 14.5) ccw
  arc A4 (-10.0712, -3) -> (-7.0712, -3) centre (-8.5712, -3) ccw projected
  line L3 (-8.5712, -3) -> (-8.5712, 3) construction
  line L4 (-10.0712, -3) -> (-10.0712, 3)
  line L5 (-7.0712, 3) -> (-7.0712, -3)
  arc A5 (-10.0712, -3) -> (-7.0712, -3) centre (-8.5712, -3) ccw
  arc A6 (-7.0712, 3) -> (-10.0712, 3) centre (-8.5712, 3) ccw
  line L6 (-20.0712, -14.5) -> (-26.0712, -14.5) construction
  line L7 (-20.0712, -13) -> (-26.0712, -13)
  line L8 (-26.0712, -16) -> (-20.0712, -16)
  arc A7 (-20.0712, -16) -> (-20.0712, -13) centre (-20.0712, -14.5) ccw
  arc A8 (-26.0712, -13) -> (-26.0712, -16) centre (-26.0712, -14.5) ccw
  line L9 (-37.5712, -3) -> (-37.5712, 3) construction
  line L10 (-39.0712, -3) -> (-39.0712, 3)
  line L11 (-36.0712, 3) -> (-36.0712, -3)
  arc A9 (-39.0712, -3) -> (-36.0712, -3) centre (-37.5712, -3) ccw
  arc A10 (-36.0712, 3) -> (-39.0712, 3) centre (-37.5712, 3) ccw
  line L12 (-20.0712, -14.5) -> (-26.0712, -14.5) construction
  line L13 (-20.0712, -13.25) -> (-26.0712, -13.25)
  line L14 (-26.0712, -15.75) -> (-20.0712, -15.75)
  arc A11 (-20.0712, -15.75) -> (-20.0712, -13.25) centre (-20.0712, -14.5) ccw
  arc A12 (-26.0712, -13.25) -> (-26.0712, -15.75) centre (-26.0712, -14.5) ccw
  line L15 (-8.5712, -3) -> (-8.5712, 3) construction
  line L16 (-9.8212, -3) -> (-9.8212, 3)
  line L17 (-7.3212, 3) -> (-7.3212, -3)
  arc A13 (-9.8212, -3) -> (-7.3212, -3) centre (-8.5712, -3) ccw
  arc A14 (-7.3212, 3) -> (-9.8212, 3) centre (-8.5712, 3) ccw
  line L18 (-20.0712, 14.5) -> (-26.0712, 14.5) construction
  line L19 (-20.0712, 15.75) -> (-26.0712, 15.75)
  line L20 (-26.0712, 13.25) -> (-20.0712, 13.25)
  arc A15 (-20.0712, 13.25) -> (-20.0712, 15.75) centre (-20.0712, 14.5) ccw
  arc A16 (-26.0712, 15.75) -> (-26.0712, 13.25) centre (-26.0712, 14.5) ccw
  line L21 (-37.5712, 3) -> (-37.5712, -3) construction
  line L22 (-38.8212, 3) -> (-38.8212, -3)
  line L23 (-36.3212, -3) -> (-36.3212, 3)
  arc A17 (-36.3212, 3) -> (-38.8212, 3) centre (-37.5712, 3) ccw
  arc A18 (-38.8212, -3) -> (-36.3212, -3) centre (-37.5712, -3) ccw
  line L24 (-10.6968, 8.1317) -> (-14.9394, 12.3744) construction
  line L25 (-9.6361, 9.1924) -> (-13.8788, 13.435)
  line L26 (-16.0001, 11.3137) -> (-11.7575, 7.0711)
  arc A19 (-11.7575, 7.0711) -> (-9.6361, 9.1924) centre (-10.6968, 8.1317) ccw
  arc A20 (-13.8788, 13.435) -> (-16.0001, 11.3137) centre (-14.9394, 12.3744) ccw
  line L27 (-14.9394, -12.3744) -> (-10.6968, -8.1317) construction
  line L28 (-16.0001, -11.3137) -> (-11.7575, -7.0711)
  line L29 (-9.6361, -9.1924) -> (-13.8788, -13.435)
  arc A21 (-16.0001, -11.3137) -> (-13.8788, -13.435) centre (-14.9394, -12.3744) ccw
  arc A22 (-9.6361, -9.1924) -> (-11.7575, -7.0711) centre (-10.6968, -8.1317) ccw
  line L30 (-31.2029, -12.3744) -> (-35.4455, -8.1317) construction
  line L31 (-30.1422, -11.3137) -> (-34.3849, -7.0711)
  line L32 (-36.5062, -9.1924) -> (-32.2636, -13.435)
  arc A23 (-32.2636, -13.435) -> (-30.1422, -11.3137) centre (-31.2029, -12.3744) ccw
  arc A24 (-34.3849, -7.0711) -> (-36.5062, -9.1924) centre (-35.4455, -8.1317) ccw
  line L33 (-35.4455, 8.1317) -> (-31.2029, 12.3744) construction
  line L34 (-36.5062, 9.1924) -> (-32.2636, 13.435)
  line L35 (-30.1422, 11.3137) -> (-34.3849, 7.0711)
  arc A25 (-36.5062, 9.1924) -> (-34.3849, 7.0711) centre (-35.4455, 8.1317) ccw
  arc A26 (-30.1422, 11.3137) -> (-32.2636, 13.435) centre (-31.2029, 12.3744) ccw
  line L36 (-31.2029, -12.3744) -> (-35.4455, -8.1317) construction
  line L37 (-30.319, -11.4905) -> (-34.5617, -7.2478)
  line L38 (-36.3294, -9.0156) -> (-32.0868, -13.2583)
  arc A27 (-32.0868, -13.2583) -> (-30.319, -11.4905) centre (-31.2029, -12.3744) ccw
  arc A28 (-34.5617, -7.2478) -> (-36.3294, -9.0156) centre (-35.4455, -8.1317) ccw
  line L39 (-14.9394, -12.3744) -> (-10.6968, -8.1317) construction
  line L40 (-15.8233, -11.4905) -> (-11.5807, -7.2478)
  line L41 (-9.8129, -9.0156) -> (-14.0556, -13.2583)
  arc A29 (-15.8233, -11.4905) -> (-14.0556, -13.2583) centre (-14.9394, -12.3744) ccw
  arc A30 (-9.8129, -9.0156) -> (-11.5807, -7.2478) centre (-10.6968, -8.1317) ccw
  line L42 (-10.6968, 8.1317) -> (-14.9394, 12.3744) construction
  line L43 (-9.8129, 9.0156) -> (-14.0556, 13.2583)
  line L44 (-15.8233, 11.4905) -> (-11.5807, 7.2478)
  arc A31 (-11.5807, 7.2478) -> (-9.8129, 9.0156) centre (-10.6968, 8.1317) ccw
  arc A32 (-14.0556, 13.2583) -> (-15.8233, 11.4905) centre (-14.9394, 12.3744) ccw
  line L45 (-31.2029, 12.3744) -> (-35.4455, 8.1317) construction
  line L46 (-32.0868, 13.2583) -> (-36.3294, 9.0156)
  line L47 (-34.5617, 7.2478) -> (-30.319, 11.4905)
  arc A33 (-30.319, 11.4905) -> (-32.0868, 13.2583) centre (-31.2029, 12.3744) ccw
  arc A34 (-36.3294, 9.0156) -> (-34.5617, 7.2478) centre (-35.4455, 8.1317) ccw
  circle A35 centre (-23.0712, 0) radius 3.6722
  point P0 (-23.0712, 14.5)
  point P1 (-8.5712, 0)
  point P2 (-23.0712, -14.5)
  point P3 (-37.5712, 0)
  point P4 (-23.0712, -14.5)
  point P5 (-8.5712, 0)
  point P6 (-23.0712, 14.5)
  point P7 (-37.5712, 0)
  point P8 (-12.8181, 10.253)
  point P9 (-12.8181, -10.253)
  point P10 (-33.3242, -10.253)
  point P11 (-33.3242, 10.253)
  point P12 (-33.3242, -10.253)
  point P13 (-12.8181, -10.253)
  point P14 (-12.8181, 10.253)
  point P15 (-33.3242, 10.253)
  dimension "d218" = 360
  dimension "d263" = 14.5
  dimension "d264" = 14.5
  dimension "d265" = 14.5
  dimension "d266" = 14.5
  dimension "d267" = 14.5
  dimension "d268" = 14.5
  dimension "d269" = 14.5
extrude "Extrusion16" [suppressed]
sketch "Sketch20" plane through (-9.3212, 16.3, 2) normal (0.7071, 0.7071, 0) x (-0.7071, 0.7071, 0)
  circle A0 centre (-1.8031, 3) radius 1.45
  line L0 (-3.6062, 6) -> (-3.6062, 0) projected
  line L1 (0, 6) -> (-3.6062, 6) projected
  point P0 (-18.1169, -2)
  point P1 (-3.6062, 3)
  point P2 (-1.8031, 6)
  dimension "d286" = 2.9
extrude "Extrusion18" cut sketch "Sketch20" against normal up to surface (5.2486 mm away)
pattern_circular "Circular Pattern4" count 4 over 360 about axis through (-23.0712, 0, 2) along (0, 0, -1) of "Extrusion18"
equation "\"d63\" = d62"
properties part number "20_Cube_Insert_Kinematic_Beautymirrormount_90_pro_v3"
